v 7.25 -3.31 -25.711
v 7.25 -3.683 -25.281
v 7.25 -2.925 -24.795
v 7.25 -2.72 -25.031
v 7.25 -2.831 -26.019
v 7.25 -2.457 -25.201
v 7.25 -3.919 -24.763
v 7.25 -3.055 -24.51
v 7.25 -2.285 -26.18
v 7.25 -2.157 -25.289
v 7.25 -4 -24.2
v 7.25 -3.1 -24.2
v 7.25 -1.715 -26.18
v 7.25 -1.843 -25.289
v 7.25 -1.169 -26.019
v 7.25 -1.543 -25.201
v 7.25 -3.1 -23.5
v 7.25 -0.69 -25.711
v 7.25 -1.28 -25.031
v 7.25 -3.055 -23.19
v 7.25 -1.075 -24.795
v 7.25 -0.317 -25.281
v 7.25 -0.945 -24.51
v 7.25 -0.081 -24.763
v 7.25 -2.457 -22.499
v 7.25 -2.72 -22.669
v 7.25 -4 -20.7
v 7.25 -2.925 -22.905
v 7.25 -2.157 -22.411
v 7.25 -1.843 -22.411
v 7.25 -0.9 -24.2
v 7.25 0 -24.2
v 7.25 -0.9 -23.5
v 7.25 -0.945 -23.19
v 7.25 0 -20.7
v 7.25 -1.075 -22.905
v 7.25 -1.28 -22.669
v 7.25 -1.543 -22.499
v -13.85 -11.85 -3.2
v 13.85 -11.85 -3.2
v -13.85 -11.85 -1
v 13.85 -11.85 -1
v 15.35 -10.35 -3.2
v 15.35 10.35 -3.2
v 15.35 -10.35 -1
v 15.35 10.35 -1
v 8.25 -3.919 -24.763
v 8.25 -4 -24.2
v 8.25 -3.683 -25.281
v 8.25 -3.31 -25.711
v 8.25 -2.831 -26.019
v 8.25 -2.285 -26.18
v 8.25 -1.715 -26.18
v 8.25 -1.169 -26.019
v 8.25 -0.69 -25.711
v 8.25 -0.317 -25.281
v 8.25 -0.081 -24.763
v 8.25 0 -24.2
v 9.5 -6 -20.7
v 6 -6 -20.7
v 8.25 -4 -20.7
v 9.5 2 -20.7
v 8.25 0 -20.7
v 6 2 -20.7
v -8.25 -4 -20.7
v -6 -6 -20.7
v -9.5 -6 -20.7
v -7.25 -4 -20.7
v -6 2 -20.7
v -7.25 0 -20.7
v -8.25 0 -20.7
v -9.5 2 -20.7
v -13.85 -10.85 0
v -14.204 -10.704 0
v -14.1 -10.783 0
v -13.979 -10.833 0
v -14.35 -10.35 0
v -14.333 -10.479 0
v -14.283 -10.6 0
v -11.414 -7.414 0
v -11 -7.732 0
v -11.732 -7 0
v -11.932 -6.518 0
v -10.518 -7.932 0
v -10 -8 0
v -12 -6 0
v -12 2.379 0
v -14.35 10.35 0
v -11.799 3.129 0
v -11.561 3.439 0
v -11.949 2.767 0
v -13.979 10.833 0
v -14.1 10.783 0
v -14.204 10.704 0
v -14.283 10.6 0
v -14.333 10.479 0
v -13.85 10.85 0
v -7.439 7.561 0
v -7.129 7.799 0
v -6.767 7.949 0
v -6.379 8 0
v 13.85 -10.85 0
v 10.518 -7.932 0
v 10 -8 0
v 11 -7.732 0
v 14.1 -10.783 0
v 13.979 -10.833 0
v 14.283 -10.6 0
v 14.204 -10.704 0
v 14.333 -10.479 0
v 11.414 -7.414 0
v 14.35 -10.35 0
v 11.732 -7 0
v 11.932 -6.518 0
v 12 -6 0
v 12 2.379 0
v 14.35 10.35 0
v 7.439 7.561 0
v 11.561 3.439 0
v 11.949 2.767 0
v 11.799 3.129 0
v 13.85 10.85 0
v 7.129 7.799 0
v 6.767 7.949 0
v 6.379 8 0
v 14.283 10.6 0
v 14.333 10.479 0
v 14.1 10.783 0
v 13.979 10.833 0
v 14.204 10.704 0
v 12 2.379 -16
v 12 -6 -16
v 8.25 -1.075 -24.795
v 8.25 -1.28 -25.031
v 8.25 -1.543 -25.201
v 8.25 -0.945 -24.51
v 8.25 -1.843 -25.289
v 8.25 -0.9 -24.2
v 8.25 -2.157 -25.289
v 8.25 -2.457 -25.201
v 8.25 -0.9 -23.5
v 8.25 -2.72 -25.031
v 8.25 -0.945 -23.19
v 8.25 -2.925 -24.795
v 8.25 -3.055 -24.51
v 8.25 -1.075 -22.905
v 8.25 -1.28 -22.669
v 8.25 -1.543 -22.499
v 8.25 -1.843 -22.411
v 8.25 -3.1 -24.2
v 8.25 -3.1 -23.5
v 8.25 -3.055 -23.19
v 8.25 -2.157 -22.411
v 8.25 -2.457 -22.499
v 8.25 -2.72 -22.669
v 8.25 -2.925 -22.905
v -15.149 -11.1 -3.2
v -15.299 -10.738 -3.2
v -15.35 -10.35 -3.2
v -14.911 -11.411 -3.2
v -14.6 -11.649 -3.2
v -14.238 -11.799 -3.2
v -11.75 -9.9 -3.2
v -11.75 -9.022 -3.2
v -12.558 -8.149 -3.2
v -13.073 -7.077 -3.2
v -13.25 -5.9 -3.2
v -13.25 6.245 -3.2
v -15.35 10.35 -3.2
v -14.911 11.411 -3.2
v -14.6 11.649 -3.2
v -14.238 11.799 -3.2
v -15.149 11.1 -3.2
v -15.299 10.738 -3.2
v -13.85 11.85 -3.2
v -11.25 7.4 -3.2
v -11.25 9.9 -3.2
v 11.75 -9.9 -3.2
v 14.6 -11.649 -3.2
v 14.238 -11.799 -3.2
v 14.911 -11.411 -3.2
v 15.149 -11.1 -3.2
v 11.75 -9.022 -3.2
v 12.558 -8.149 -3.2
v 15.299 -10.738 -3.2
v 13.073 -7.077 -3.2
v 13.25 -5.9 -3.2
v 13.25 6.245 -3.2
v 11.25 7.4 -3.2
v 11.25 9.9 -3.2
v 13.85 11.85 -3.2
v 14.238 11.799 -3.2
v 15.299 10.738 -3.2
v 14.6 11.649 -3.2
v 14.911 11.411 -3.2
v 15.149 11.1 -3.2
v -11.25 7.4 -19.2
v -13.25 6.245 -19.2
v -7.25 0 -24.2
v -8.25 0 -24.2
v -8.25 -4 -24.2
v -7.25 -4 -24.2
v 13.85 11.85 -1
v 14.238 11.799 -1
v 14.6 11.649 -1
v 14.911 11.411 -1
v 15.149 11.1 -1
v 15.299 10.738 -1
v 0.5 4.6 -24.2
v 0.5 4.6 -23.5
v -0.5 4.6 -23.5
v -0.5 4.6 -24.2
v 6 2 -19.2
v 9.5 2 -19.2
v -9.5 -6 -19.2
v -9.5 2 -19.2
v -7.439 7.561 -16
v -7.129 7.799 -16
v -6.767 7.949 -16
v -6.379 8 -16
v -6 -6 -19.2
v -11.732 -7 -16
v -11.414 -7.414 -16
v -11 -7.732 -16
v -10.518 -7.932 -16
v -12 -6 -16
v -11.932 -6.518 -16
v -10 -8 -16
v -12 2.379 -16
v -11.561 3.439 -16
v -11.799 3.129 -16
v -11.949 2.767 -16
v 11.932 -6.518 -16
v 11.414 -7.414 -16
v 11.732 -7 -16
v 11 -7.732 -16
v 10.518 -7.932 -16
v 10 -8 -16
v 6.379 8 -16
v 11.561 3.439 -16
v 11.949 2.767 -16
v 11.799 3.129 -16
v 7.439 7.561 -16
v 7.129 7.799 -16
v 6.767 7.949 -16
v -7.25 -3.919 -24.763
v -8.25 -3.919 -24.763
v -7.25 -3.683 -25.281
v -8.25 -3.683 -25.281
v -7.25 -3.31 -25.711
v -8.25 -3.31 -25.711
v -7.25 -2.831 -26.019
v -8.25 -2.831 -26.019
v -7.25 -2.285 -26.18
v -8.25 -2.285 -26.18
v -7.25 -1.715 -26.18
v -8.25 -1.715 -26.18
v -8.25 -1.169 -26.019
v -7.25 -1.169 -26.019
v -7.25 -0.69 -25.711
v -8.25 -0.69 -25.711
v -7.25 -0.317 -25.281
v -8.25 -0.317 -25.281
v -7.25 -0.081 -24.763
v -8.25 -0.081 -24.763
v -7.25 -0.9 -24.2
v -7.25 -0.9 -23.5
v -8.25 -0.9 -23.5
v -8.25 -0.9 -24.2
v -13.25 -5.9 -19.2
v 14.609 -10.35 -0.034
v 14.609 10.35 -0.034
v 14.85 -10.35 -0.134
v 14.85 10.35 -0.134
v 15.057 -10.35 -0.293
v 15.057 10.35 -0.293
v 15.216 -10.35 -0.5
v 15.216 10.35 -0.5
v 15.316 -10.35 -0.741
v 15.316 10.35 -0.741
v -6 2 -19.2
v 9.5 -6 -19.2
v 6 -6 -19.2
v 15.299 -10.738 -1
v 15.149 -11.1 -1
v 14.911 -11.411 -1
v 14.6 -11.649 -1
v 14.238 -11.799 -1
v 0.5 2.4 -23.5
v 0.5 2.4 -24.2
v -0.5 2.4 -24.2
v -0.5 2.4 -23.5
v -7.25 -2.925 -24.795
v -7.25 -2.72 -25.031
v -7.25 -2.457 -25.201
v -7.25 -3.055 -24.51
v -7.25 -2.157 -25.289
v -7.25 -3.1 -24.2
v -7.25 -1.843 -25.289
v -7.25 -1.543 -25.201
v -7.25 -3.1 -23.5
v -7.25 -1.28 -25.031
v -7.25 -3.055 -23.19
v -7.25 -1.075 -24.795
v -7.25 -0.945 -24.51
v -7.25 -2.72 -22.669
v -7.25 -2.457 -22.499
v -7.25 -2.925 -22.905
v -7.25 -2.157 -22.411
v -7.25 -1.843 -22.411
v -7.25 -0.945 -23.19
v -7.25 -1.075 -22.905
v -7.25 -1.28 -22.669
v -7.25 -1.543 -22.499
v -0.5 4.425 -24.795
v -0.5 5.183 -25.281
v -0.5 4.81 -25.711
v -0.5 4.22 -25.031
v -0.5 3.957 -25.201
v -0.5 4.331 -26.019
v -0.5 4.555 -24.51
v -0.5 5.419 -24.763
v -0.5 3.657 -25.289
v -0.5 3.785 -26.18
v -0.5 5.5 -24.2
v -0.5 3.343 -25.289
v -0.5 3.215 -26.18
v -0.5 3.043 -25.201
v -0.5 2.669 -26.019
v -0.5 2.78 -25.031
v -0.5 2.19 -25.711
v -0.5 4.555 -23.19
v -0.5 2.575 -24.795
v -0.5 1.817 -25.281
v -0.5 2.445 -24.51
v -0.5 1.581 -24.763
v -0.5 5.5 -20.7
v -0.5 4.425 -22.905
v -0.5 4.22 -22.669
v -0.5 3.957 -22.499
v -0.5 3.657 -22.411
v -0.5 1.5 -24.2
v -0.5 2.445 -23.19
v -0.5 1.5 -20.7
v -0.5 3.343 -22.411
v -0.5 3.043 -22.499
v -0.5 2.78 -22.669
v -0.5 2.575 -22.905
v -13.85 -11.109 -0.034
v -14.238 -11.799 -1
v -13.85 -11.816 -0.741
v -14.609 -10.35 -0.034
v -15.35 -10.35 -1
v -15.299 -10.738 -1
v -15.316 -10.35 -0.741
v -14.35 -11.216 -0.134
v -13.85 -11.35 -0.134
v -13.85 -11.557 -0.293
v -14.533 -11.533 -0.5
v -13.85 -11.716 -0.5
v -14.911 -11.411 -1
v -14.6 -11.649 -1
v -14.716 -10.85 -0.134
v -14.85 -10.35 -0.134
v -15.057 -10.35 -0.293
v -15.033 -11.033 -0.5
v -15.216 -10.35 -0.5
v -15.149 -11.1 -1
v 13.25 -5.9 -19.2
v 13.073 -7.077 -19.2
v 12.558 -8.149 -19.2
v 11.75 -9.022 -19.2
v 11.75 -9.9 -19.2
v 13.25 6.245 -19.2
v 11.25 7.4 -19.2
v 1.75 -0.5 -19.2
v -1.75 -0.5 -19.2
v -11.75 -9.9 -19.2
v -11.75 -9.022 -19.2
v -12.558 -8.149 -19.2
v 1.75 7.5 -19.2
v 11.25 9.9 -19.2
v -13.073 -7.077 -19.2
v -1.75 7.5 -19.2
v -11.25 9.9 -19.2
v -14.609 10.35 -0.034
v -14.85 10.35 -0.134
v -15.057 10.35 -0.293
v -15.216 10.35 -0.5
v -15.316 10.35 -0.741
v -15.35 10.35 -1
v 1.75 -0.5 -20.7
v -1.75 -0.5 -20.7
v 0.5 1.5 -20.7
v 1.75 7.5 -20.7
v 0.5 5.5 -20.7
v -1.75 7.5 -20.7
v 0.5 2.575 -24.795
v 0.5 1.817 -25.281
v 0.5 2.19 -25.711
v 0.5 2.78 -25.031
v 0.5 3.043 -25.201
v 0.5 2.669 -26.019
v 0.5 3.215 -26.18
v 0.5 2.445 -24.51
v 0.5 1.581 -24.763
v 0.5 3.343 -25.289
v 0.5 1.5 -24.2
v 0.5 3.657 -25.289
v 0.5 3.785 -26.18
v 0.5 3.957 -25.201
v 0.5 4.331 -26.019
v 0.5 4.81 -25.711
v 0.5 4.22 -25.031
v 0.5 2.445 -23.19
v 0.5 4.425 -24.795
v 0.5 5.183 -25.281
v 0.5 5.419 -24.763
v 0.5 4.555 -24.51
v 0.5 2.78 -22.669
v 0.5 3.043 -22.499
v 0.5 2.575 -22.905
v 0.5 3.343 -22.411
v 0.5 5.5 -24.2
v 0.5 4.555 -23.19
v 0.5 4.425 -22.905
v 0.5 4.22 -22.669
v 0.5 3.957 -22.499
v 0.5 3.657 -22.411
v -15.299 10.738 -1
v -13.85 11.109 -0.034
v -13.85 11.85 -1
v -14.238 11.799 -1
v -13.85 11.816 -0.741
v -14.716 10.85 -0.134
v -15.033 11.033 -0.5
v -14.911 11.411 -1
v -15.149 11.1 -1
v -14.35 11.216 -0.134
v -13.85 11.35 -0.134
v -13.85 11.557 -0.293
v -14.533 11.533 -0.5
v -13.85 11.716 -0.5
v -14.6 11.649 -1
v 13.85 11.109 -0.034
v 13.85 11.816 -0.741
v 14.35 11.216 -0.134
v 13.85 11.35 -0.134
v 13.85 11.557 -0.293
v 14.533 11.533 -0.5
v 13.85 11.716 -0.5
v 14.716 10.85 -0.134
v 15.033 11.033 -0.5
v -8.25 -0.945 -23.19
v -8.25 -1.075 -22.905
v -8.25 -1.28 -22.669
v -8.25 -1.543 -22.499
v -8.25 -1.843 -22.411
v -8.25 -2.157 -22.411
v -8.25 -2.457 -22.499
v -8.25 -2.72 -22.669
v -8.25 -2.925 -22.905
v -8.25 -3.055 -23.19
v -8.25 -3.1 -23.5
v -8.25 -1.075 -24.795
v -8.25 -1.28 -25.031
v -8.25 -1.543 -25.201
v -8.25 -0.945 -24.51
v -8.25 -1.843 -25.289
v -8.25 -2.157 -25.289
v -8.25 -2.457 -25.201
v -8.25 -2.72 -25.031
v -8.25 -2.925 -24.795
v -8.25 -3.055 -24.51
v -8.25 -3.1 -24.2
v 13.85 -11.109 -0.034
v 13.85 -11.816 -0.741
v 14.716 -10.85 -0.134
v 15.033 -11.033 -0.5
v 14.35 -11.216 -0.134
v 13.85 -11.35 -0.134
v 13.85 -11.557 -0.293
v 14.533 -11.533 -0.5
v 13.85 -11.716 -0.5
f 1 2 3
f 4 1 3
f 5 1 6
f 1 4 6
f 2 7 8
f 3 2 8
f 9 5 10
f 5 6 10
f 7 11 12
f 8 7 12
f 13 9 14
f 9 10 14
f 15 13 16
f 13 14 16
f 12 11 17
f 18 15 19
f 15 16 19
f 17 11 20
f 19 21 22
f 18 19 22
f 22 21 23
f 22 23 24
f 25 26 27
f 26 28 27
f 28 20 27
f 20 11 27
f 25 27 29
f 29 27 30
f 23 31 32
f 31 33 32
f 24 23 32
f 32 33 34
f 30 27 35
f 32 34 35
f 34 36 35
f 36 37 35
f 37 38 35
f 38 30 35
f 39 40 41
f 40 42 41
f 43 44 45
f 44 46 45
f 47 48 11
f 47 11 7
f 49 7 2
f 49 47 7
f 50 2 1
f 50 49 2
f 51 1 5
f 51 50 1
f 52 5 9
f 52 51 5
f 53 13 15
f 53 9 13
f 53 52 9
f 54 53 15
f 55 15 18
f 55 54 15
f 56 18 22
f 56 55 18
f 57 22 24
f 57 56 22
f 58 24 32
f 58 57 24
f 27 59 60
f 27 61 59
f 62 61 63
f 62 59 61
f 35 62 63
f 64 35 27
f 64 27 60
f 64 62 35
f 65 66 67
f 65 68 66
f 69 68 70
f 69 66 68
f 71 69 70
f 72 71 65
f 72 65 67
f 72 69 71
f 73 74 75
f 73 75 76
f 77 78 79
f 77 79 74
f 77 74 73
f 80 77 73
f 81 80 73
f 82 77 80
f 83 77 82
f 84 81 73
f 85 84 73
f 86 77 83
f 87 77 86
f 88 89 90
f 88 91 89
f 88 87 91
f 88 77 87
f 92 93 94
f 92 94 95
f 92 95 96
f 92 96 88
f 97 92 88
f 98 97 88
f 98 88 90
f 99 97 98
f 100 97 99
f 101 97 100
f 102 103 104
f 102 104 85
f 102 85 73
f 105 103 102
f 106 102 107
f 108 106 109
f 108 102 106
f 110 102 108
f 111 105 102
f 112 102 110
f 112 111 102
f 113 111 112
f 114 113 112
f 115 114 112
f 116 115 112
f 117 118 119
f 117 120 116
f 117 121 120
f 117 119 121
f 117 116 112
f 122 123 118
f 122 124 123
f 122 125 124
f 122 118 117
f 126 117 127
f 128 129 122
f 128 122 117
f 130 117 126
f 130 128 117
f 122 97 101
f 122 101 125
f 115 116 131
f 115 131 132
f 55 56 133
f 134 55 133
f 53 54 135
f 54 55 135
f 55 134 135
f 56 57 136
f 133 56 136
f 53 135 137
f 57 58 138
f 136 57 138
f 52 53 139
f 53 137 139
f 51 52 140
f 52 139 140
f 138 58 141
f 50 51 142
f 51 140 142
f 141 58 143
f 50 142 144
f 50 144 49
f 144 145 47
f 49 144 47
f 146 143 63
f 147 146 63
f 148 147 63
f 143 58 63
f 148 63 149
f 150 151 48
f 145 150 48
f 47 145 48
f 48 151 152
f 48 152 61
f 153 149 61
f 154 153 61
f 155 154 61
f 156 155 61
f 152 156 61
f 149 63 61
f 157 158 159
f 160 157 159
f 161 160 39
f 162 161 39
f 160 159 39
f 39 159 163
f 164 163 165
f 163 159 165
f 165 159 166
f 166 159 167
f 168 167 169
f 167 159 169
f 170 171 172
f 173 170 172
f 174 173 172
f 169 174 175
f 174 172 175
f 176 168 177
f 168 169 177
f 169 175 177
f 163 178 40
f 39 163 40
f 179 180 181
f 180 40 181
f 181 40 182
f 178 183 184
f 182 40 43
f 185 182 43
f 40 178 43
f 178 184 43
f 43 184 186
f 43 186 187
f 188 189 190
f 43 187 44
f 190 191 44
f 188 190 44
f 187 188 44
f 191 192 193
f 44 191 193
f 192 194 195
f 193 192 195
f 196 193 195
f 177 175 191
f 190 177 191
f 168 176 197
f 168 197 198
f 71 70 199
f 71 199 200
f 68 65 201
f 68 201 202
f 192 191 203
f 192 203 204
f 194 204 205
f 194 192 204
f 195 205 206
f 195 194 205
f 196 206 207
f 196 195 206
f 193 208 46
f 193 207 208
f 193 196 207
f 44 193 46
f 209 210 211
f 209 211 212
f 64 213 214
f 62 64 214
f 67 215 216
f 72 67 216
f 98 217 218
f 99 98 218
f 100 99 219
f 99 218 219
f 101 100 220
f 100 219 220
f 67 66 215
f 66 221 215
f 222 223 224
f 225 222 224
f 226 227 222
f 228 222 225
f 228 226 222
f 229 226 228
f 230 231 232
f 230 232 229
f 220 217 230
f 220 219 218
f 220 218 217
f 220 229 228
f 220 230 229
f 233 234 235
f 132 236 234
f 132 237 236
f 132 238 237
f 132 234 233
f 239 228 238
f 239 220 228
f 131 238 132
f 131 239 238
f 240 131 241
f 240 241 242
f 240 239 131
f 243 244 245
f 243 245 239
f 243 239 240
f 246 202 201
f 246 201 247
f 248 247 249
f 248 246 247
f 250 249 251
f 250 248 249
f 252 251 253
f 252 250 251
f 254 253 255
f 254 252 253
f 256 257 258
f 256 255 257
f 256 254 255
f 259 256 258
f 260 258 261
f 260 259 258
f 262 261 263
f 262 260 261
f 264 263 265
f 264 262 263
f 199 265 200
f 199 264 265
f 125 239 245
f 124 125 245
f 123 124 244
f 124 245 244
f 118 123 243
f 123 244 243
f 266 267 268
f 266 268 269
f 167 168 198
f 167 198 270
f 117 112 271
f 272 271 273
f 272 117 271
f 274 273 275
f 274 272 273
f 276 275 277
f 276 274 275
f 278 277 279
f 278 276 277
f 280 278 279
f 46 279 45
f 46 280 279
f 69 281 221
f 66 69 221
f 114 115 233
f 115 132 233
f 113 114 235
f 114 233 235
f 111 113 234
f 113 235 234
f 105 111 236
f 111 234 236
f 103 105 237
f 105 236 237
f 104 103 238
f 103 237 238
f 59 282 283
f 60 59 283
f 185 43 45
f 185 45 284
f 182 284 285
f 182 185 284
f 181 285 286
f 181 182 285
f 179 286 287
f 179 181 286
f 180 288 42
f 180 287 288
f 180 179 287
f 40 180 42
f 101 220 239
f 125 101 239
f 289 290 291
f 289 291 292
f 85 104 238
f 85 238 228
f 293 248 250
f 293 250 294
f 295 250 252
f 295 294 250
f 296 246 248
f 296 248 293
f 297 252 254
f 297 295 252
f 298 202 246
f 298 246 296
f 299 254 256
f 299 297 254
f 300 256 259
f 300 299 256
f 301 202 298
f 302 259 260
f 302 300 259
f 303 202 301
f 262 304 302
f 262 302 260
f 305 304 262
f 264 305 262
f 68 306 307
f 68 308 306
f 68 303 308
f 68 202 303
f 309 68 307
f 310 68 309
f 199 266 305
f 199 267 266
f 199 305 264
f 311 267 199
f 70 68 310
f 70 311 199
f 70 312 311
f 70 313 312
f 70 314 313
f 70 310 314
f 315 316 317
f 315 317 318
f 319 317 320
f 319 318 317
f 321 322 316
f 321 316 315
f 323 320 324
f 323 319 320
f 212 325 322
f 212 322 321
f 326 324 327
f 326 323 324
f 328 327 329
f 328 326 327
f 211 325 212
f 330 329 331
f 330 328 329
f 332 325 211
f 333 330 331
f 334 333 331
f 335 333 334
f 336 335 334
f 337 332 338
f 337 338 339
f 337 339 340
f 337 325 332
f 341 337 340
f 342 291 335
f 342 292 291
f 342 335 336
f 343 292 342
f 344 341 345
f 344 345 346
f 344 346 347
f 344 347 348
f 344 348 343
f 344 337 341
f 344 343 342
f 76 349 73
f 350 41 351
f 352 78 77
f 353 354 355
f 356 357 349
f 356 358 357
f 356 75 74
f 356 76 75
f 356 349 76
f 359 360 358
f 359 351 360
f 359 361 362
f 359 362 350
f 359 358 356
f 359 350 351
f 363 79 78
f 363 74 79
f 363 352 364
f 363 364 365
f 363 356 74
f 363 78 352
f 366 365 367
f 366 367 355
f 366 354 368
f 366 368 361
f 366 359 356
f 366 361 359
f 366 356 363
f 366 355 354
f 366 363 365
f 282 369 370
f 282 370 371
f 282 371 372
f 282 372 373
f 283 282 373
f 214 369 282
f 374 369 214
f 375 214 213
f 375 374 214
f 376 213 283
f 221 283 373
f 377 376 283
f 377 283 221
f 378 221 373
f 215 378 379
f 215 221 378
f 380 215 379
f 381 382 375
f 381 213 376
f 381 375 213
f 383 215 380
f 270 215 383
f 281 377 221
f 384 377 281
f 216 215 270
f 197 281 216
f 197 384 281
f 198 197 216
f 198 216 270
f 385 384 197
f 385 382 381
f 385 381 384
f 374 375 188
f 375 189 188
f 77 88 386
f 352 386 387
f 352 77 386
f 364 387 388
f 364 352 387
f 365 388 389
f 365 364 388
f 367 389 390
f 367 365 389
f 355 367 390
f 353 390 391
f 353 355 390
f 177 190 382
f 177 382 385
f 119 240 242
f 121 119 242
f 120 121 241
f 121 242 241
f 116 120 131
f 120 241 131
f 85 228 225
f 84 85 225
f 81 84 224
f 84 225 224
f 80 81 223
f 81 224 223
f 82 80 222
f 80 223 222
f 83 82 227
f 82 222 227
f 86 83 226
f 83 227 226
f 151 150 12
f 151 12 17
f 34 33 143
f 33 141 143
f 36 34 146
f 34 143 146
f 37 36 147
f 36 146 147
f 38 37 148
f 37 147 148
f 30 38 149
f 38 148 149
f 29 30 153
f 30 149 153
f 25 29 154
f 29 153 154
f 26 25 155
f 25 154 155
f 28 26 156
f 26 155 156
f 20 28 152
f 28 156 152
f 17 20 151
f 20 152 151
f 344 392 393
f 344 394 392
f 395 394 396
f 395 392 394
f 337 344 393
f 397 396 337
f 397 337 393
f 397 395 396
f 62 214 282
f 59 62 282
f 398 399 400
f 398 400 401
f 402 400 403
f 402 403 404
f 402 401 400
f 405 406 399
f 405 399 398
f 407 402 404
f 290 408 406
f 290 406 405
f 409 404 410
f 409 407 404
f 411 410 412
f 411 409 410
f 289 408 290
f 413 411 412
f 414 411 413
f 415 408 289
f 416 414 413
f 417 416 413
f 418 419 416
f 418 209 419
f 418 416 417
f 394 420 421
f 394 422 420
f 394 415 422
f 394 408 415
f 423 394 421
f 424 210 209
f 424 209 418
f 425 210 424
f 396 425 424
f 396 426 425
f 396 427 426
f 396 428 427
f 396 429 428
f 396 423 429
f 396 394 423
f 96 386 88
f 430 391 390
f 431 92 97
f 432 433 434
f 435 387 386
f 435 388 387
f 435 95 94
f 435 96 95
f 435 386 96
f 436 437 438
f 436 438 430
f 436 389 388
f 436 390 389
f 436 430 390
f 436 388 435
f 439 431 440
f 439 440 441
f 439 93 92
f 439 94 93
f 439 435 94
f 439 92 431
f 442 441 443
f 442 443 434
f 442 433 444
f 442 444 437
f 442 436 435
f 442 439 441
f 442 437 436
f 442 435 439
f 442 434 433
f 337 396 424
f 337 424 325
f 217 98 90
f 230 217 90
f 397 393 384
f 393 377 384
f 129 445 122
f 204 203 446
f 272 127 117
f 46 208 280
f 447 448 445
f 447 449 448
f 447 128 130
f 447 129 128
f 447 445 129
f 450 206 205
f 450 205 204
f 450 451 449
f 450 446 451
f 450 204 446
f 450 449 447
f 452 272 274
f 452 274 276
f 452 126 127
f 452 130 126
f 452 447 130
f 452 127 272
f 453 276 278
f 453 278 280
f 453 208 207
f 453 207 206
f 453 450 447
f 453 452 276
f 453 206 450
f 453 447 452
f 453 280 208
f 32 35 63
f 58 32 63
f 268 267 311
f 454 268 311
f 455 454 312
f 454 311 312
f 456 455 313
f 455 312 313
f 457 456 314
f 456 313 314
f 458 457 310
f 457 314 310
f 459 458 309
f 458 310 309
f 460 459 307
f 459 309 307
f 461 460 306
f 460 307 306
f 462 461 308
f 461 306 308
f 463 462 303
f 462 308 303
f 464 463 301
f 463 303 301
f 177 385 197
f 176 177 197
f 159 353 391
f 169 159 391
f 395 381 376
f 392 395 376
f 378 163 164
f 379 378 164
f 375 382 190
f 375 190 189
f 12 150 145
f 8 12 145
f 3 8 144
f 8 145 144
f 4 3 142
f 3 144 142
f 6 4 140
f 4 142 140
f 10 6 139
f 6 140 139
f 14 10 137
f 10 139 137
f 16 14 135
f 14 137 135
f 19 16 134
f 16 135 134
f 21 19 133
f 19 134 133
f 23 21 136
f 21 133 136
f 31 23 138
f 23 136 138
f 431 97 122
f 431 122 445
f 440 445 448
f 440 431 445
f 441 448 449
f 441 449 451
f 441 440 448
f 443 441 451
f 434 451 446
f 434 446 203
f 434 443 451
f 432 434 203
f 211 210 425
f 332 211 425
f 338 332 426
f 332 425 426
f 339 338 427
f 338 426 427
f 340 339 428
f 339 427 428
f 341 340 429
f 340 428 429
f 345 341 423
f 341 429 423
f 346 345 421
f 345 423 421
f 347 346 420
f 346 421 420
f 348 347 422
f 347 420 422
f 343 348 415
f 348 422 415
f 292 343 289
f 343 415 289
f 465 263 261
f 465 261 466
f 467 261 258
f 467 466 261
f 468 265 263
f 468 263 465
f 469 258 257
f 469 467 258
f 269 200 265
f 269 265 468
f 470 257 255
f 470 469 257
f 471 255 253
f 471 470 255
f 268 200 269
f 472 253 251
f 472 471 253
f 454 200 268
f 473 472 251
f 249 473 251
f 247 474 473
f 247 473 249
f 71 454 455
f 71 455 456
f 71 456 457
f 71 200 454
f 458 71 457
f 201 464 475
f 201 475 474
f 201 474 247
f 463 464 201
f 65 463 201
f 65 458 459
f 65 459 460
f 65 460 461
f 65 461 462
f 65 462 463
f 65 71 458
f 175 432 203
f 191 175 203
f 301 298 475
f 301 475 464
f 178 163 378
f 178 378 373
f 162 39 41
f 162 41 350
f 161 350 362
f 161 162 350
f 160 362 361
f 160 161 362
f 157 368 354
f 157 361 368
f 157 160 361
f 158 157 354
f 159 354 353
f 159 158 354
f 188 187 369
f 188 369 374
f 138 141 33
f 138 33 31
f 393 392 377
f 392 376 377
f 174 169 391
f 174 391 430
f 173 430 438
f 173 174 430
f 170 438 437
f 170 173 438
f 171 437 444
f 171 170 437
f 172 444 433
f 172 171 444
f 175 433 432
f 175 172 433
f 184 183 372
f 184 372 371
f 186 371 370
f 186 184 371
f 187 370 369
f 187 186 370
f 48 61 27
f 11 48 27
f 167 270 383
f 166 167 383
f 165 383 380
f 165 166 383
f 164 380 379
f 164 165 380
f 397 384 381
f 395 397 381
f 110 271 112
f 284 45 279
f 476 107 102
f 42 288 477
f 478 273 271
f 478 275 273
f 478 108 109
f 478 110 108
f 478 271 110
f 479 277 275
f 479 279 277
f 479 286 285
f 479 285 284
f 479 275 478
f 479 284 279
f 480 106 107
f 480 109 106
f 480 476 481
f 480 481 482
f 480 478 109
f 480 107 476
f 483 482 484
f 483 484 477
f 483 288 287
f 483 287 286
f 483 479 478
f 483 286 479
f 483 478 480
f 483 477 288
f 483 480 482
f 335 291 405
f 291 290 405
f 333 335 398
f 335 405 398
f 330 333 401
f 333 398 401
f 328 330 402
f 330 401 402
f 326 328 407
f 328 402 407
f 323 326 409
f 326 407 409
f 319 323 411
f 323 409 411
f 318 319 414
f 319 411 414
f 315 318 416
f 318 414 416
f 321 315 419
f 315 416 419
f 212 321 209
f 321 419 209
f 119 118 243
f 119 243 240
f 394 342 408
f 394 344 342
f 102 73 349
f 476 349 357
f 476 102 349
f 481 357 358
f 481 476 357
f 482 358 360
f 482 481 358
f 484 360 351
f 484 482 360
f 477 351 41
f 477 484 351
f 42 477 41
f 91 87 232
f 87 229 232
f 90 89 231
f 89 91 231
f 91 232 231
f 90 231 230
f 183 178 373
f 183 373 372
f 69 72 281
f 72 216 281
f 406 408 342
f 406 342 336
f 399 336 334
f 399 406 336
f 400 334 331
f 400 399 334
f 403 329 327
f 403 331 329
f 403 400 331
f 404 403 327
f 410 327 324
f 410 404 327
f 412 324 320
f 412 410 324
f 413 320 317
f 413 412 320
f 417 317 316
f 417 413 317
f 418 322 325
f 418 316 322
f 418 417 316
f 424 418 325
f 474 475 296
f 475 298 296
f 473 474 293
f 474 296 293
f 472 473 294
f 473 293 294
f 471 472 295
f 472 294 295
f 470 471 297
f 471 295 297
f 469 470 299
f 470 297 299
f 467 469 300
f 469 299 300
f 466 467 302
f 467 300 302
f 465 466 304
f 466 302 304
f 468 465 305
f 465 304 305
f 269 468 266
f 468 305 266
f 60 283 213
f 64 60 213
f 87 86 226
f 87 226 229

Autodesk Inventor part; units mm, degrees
ref_plane "YZ Plane" through (0, 0, 0) normal (1, 0, 0) x (0, 1, 0)
ref_plane "XZ Plane" through (0, 0, 0) normal (0, 1, 0) x (-1, 0, 0)
ref_plane "XY Plane" through (0, 0, 0) normal (0, 0, 1) x (1, 0, 0)
sketch "Sketch1" plane through (0, 0, 0) normal (0, 0, 1) x (1, 0, 0)
  line L0 (-15.35, 11.85) -> (15.35, 11.85)
  line L1 (15.35, 11.85) -> (15.35, -11.85)
  line L2 (15.35, -11.85) -> (-15.35, -11.85)
  line L3 (-15.35, -11.85) -> (-15.35, 11.85)
  point P0 (0, 0)
  dimension "d0" = 30.7
  dimension "d2" = 23.7
  dimension "d3" = 15.35
  dimension "d4" = 11.85
extrude "Extrusion1" add sketch "Sketch1" against normal blind 3.2
sketch "Sketch2" plane through (0, 0, -3.2) normal (0, 0, -1) x (-1, 0, 0)
  line L0 (15.35, -11.85) -> (15.35, 11.85) projected
  line L1 (-11.25, 9.9) -> (11.25, 9.9)
  line L2 (13.25, 6.2453) -> (13.25, -5.9)
  line L3 (11.75, -9.9) -> (-11.75, -9.9)
  line L4 (-13.25, -5.9) -> (-13.25, 6.2453)
  line L5 (11.75, -9.9) -> (11.75, -9.0225)
  arc A0 (11.75, -9.0225) -> (13.25, -5.9) centre (9.25, -5.9) ccw
  line L6 (0, 0) -> (0, 2.1839)
  line L7 (-11.75, -9.9) -> (-11.75, -9.0225)
  arc A1 (-13.25, -5.9) -> (-11.75, -9.0225) centre (-9.25, -5.9) ccw
  line L8 (11.25, 9.9) -> (11.25, 7.4)
  line L9 (11.25, 7.4) -> (13.25, 6.2453)
  line L10 (-11.25, 9.9) -> (-11.25, 7.4)
  line L11 (-11.25, 7.4) -> (-13.25, 6.2453)
  dimension "d10" = 9.9
  dimension "d11" = 13.25
  dimension "d13" = 8
  dimension "d15" = 1.5
  dimension "d19" = 120
  dimension "d20" = 19.8
  dimension "d21" = 2
  dimension "d22" = 2.5
extrude "Extrusion2" add sketch "Sketch2" along normal blind 16
sketch "Sketch3" plane through (0, 0, -19.2) normal (0, 0, -1) x (-1, 0, 0)
  line L0 (-11.25, 9.9) -> (-11.25, 7.4) projected
  line L1 (-1.75, 7.5) -> (-1.75, -0.5)
  line L2 (-1.75, -0.5) -> (1.75, -0.5)
  line L3 (1.75, -0.5) -> (1.75, 7.5)
  line L4 (1.75, 7.5) -> (-1.75, 7.5)
  line L5 (-9.5, 2) -> (-9.5, -6)
  line L6 (-9.5, -6) -> (-6, -6)
  line L7 (-6, -6) -> (-6, 2)
  line L8 (-6, 2) -> (-9.5, 2)
  line L9 (6, 2) -> (6, -6)
  line L10 (6, -6) -> (9.5, -6)
  line L11 (9.5, -6) -> (9.5, 2)
  line L12 (9.5, 2) -> (6, 2)
  point P0 (0, 0)
  dimension "d25" = 3.5
  dimension "d27" = 8
  dimension "d28" = 1.75
  dimension "d29" = 7.5
  dimension "d30" = 3.5
  dimension "d31" = 8
  dimension "d32" = 3.5
  dimension "d33" = 8
  dimension "d34" = 2
  dimension "d35" = 2
  dimension "d36" = 6
  dimension "d37" = 6
extrude "Extrusion3" add sketch "Sketch3" along normal blind 1.5
sketch "Sketch4" plane through (0, 0, -20.7) normal (0, 0, -1) x (-1, 0, 0)
  line L0 (-6, -6) -> (-6, 2) projected
  line L1 (-6, 2) -> (-9.5, 2) projected
  line L2 (-8.25, 0) -> (-8.25, -4)
  line L3 (-8.25, -4) -> (-7.25, -4)
  line L4 (-7.25, -4) -> (-7.25, 0)
  line L5 (-7.25, 0) -> (-8.25, 0)
  point P0 (-9.5, -6)
  point P1 (0, 0)
  dimension "d40" = 4
  dimension "d42" = 1
  dimension "d43" = 1.25
  dimension "d44" = 3.5
  dimension "d45" = 8
  dimension "d46" = 2
extrude "Extrusion4" add sketch "Sketch4" along normal blind 5.5
sketch "Sketch6" plane through (0, 0, -20.7) normal (0, 0, -1) x (-1, 0, 0)
  line L0 (-1.75, -0.5) -> (1.75, -0.5) projected
  line L1 (1.75, -0.5) -> (1.75, 7.5) projected
  line L2 (1.75, 7.5) -> (-1.75, 7.5) projected
  line L3 (-0.5, 5.5) -> (0.5, 5.5)
  line L4 (0.5, 5.5) -> (0.5, 1.5)
  line L5 (0.5, 1.5) -> (-0.5, 1.5)
  line L6 (-0.5, 1.5) -> (-0.5, 5.5)
  point P0 (0, 0)
  dimension "d55" = 1
  dimension "d57" = 4
  dimension "d58" = 1.25
  dimension "d59" = 2
  dimension "d60" = 8
  dimension "d61" = 2
extrude "Extrusion5" add sketch "Sketch6" along normal blind 5.5
sketch "Sketch7" plane through (0, 0, -20.7) normal (0, 0, -1) x (-1, 0, 0)
  line L0 (9.5, -6) -> (9.5, 2) projected
  line L1 (9.5, 2) -> (6, 2) projected
  line L2 (8.25, -4) -> (7.25, -4)
  line L3 (7.25, -4) -> (7.25, 0)
  line L4 (7.25, 0) -> (8.25, 0)
  line L5 (8.25, 0) -> (8.25, -4)
  point P0 (0, 0)
  dimension "d64" = 2
  dimension "d65" = 4
  dimension "d66" = 1.25
  dimension "d67" = 1
extrude "Extrusion6" add sketch "Sketch7" along normal blind 5.5
sketch "Sketch8" plane through (8.25, -4, -20.7) normal (1, 0, 0) x (0, 0, -1)
  line L0 (0, 0) -> (0, 4) projected
  line L1 (0, 0) -> (5.5, 0) projected
  line L2 (5.5, 4) -> (5.5, 0) projected
  line L3 (0, 4) -> (5.5, 4) projected
  arc A0 (3.5, 0) -> (3.5, 4) centre (3.5, 2) ccw
  arc A1 (3.5, 0.9) -> (3.5, 3.1) centre (3.5, 2) ccw
  line L4 (3.5, 2) -> (2.8, 2)
  arc A2 (2.8, 3.1) -> (2.8, 0.9) centre (2.8, 2) ccw
  line L5 (2.8, 3.1) -> (3.5, 3.1)
  line L6 (3.5, 0.9) -> (2.8, 0.9)
  line L7 (3.5, 4) -> (5.5, 4)
  line L8 (5.5, 4) -> (5.5, 0)
  line L9 (5.5, 0) -> (3.5, 0)
  point P0 (-20.7, 4)
  dimension "d70" = 4
  dimension "d72" = 2.2
  dimension "d73" = 0.7
  dimension "d74" = 2.2
extrude "Extrusion7" cut sketch "Sketch8" against normal blind 1 contours A0 L2 L1 | L3 L2 A0 | L6 A2 L5 A1
sketch "Sketch11" plane through (0.5, 1.5, -20.7) normal (1, 0, 0) x (0, 0, -1)
  line L0 (0, 0) -> (0, 4) projected
  line L1 (0, 0) -> (5.5, 0) projected
  line L2 (5.5, 4) -> (5.5, 0) projected
  line L3 (0, 4) -> (5.5, 4) projected
  arc A0 (3.5, 0) -> (3.5, 4) centre (3.5, 2) ccw
  line L4 (3.5, 0) -> (5.5, 0)
  line L5 (5.5, 4) -> (5.5, 0)
  line L6 (5.5, 4) -> (3.5, 4)
  arc A1 (3.5, 0.9) -> (3.5, 3.1) centre (3.5, 2) ccw
  line L7 (3.5, 2) -> (2.8, 2)
  arc A2 (2.8, 3.1) -> (2.8, 0.9) centre (2.8, 2) ccw
  line L8 (2.8, 3.1) -> (3.5, 3.1)
  line L9 (3.5, 0.9) -> (2.8, 0.9)
  point P0 (-20.7, -1.5)
  dimension "d88" = 4
  dimension "d91" = 2.2
  dimension "d92" = 0.7
  dimension "d93" = 2.2
sketch "Sketch12" plane through (-7.25, -4, -20.7) normal (1, 0, 0) x (0, 0, -1)
  arc A0 (3.5, 0) -> (3.5, 4) centre (3.5, 2) ccw
  arc A1 (3.5, 0.9) -> (3.5, 3.1) centre (3.5, 2) ccw
  line L0 (3.5, 2) -> (2.8, 2)
  arc A2 (2.8, 3.1) -> (2.8, 0.9) centre (2.8, 2) ccw
  line L1 (2.8, 3.1) -> (3.5, 3.1)
  line L2 (3.5, 0.9) -> (2.8, 0.9)
  line L3 (0, 4) -> (5.5, 4) projected
  line L4 (5.5, 4) -> (5.5, 0)
  line L5 (5.5, 4) -> (3.5, 4)
  line L6 (3.5, 0) -> (5.5, 0)
  point P0 (-20.7, -1.5)
  dimension "d94" = 4
  dimension "d95" = 2.2
  dimension "d96" = 0.7
  dimension "d97" = 2.2
extrude "Extrusion8" cut sketch "Sketch11" against normal blind 1 contours A0 L2 L1 | L3 L2 A0 | L9 A2 L8 A1
extrude "Extrusion9" cut sketch "Sketch12" against normal blind 1 contours L2 A2 L1 A1
sketch "Sketch13" plane through (-7.25, -4, -20.7) normal (1, 0, 0) x (0, 0, -1)
  line L0 (0, 0) -> (5.5, 0) projected
  line L1 (5.5, 4) -> (5.5, 0) projected
  line L2 (0, 4) -> (5.5, 4) projected
  circle A0 centre (3.5, 2) radius 2
  line L3 (3.5, 4) -> (5.5, 4)
  line L4 (5.5, 0) -> (5.5, 4)
  line L5 (3.5, 0) -> (5.5, 0)
  point P0 (-20.7, 4)
  dimension "d102" = 4
extrude "Extrusion10" cut sketch "Sketch13" against normal blind 1 contours A0 L1 L0 | L2 L1 A0
sketch "Sketch14" plane through (0, 0, 0) normal (0, 0, 1) x (1, 0, 0)
  line L0 (12, -8) -> (-12, -8)
  line L1 (-7, 8) -> (7, 8)
  line L2 (12, 3) -> (12, -8)
  line L3 (7, 8) -> (12, 3)
  line L4 (0, 0) -> (0, 4.7583)
  line L5 (-7, 8) -> (-12, 3)
  line L6 (-12, -8) -> (-12, 3)
  dimension "d107" = 16
  dimension "d108" = 12
  dimension "d109" = 8
  dimension "d110" = 45
  dimension "d111" = 5
extrude "Extrusion11" cut sketch "Sketch14" against normal blind 16
fillet "Fillet1" radius 1.5 4 edges at (-15.35, 11.85, -1.6) (15.35, 11.85, -1.6) (15.35, -11.85, -1.6) (-15.35, -11.85, -1.6)
fillet "Fillet2" radius 2 2 edges at (-12, -8, -8) (12, -8, -8)
fillet "Fillet3" radius 1.5 4 edges at (-12, 3, -8) (-7, 8, -8) (7, 8, -8) (12, 3, -8)
fillet "Fillet4" radius 1 8 edges at (-14.9107, 11.4107, 0) (0, 11.85, 0) (14.9107, 11.4107, 0) (15.35, 0, 0) (14.9107, -11.4107, 0) (0, -11.85, 0) (-14.9107, -11.4107, 0) (-15.35, 0, 0)
properties part number "701W-X202"
